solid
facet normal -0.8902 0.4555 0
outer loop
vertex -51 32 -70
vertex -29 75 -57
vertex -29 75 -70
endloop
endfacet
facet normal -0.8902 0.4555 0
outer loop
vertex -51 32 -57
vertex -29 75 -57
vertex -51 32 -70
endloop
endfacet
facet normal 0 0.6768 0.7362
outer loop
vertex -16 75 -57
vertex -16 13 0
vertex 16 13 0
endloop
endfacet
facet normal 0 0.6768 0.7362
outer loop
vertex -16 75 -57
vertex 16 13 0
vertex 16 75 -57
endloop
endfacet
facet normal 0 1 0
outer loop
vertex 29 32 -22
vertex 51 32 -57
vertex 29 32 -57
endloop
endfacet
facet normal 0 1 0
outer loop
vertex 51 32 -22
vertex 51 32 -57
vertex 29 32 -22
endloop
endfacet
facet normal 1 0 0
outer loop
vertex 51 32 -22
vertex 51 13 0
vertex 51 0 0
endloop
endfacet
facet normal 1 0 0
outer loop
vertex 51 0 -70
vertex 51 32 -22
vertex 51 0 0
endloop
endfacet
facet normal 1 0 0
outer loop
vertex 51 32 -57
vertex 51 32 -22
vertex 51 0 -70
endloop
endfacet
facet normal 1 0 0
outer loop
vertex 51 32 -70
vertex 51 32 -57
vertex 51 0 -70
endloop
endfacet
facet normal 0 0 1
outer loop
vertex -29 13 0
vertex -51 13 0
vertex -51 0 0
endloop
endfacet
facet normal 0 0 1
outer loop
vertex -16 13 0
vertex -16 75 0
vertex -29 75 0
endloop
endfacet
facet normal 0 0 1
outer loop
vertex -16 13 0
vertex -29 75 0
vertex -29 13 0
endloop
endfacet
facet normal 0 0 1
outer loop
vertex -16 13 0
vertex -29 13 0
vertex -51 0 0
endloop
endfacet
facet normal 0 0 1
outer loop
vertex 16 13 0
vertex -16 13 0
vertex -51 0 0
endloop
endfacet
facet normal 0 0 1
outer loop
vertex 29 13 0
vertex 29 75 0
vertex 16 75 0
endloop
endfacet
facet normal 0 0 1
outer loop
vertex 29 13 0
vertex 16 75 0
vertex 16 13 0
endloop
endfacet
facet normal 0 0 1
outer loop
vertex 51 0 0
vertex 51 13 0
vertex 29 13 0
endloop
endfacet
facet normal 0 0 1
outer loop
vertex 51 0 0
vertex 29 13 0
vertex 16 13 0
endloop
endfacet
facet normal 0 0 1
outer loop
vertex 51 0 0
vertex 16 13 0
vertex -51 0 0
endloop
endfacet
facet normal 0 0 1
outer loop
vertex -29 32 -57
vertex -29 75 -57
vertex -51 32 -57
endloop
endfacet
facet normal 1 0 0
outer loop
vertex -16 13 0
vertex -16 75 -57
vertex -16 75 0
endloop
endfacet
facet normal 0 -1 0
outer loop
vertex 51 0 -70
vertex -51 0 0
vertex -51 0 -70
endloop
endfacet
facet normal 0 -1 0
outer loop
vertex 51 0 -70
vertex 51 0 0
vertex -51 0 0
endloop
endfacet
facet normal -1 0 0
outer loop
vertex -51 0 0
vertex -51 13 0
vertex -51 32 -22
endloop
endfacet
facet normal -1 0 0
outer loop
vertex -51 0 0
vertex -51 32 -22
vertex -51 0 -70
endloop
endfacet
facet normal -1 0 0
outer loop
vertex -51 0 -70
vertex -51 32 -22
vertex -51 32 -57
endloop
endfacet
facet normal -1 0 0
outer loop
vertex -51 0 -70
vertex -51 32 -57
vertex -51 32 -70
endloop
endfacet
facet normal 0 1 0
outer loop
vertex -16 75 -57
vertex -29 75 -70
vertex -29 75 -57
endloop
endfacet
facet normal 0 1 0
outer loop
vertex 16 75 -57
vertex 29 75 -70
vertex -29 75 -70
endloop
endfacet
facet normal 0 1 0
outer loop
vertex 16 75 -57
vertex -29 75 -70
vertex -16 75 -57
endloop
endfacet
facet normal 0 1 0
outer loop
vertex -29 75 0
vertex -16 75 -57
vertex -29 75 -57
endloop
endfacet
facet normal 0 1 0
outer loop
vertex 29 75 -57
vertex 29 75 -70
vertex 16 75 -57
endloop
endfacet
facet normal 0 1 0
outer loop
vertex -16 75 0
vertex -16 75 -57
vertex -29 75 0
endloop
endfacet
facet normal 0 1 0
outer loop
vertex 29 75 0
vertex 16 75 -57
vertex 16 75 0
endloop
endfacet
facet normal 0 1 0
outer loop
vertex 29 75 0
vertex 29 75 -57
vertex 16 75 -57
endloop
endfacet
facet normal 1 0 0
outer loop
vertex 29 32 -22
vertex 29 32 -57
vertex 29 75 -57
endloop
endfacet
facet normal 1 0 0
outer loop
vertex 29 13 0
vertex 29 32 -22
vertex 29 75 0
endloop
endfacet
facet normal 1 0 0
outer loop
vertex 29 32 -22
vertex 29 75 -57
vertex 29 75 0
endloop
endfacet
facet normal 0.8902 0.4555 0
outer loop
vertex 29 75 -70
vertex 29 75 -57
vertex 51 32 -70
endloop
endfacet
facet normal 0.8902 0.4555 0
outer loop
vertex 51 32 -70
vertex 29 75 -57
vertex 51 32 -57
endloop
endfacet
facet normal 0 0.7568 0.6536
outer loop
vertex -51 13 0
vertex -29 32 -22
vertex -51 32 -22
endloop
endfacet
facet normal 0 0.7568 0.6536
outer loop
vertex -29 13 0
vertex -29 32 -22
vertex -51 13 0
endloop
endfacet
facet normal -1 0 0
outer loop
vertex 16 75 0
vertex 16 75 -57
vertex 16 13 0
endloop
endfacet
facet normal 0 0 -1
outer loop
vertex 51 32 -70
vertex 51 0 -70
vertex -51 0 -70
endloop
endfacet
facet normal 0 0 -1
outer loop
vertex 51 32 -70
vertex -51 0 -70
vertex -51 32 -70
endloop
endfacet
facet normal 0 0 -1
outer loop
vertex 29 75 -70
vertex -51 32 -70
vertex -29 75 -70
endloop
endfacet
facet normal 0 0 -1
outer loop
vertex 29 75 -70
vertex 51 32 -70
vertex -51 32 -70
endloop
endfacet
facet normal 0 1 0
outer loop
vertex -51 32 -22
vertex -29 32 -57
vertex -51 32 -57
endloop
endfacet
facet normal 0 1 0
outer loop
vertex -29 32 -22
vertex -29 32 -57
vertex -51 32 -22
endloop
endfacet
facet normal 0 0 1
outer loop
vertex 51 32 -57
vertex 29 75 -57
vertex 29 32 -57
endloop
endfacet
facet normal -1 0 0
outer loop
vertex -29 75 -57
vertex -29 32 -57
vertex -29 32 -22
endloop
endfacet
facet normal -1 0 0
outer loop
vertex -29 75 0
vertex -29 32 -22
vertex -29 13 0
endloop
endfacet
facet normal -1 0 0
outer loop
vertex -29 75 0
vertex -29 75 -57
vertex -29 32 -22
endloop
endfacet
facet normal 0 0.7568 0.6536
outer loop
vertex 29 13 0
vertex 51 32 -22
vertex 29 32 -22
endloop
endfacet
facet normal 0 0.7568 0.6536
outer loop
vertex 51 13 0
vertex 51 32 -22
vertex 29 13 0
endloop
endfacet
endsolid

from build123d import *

# Parameters (mm, degrees)
BOSS_EXTRUDE1_DEPTH      = 51
BOSS_EXTRUDE2_START      = 16
BOSS_EXTRUDE2_DEPTH      = 13
CUT_EXTRUDE1_REACH       = 109.121
BOSS_EXTRUDE3_DEPTH      = 16
BOSS_EXTRUDE3_DEPTH_BACK = 16


with BuildPart() as part:
    # Sketch1 → Boss-Extrude1 (new, symmetric)
    with BuildSketch(Plane(origin=(0, 0, 0), x_dir=(0, 0, -1), z_dir=(1, 0, 0))):
        Polygon((70, 75), (57, 75), (57, 32), (22, 32), (0, 13), (0, 0), (70, 0), align=None)
    extrude(amount=BOSS_EXTRUDE1_DEPTH, both=True)

    # Sketch1<3> → Boss-Extrude2 (add)
    with BuildSketch(Plane(origin=(0, 0, 0), x_dir=(0, 0, -1), z_dir=(1, 0, 0)).offset(BOSS_EXTRUDE2_START)):
        Polygon((0, 13), (57, 75), (57, 32), (22, 32), align=None)
        Polygon((0, 13), (57, 75), (0, 75), align=None)
    boss_extrude2 = extrude(amount=BOSS_EXTRUDE2_DEPTH)

    # Sketch2 → Cut-Extrude1 (cut, up to next)
    with BuildSketch(Plane.XY.offset(-57), mode=Mode.PRIVATE) as cut_extrude1_sk1:
        Polygon((29, 75), (51, 32), (51, 75), align=None)
    cut_extrude1_tool1 = extrude(cut_extrude1_sk1.sketch, amount=-CUT_EXTRUDE1_REACH, mode=Mode.PRIVATE) & part.part
    cut_extrude1 = cut_extrude1_tool1.solids().sort_by_distance((43.666667, 60.666667, -57))[0]
    add(cut_extrude1, mode=Mode.SUBTRACT)

    # Mirror1: Boss-Extrude2, Cut-Extrude1 across plane
    add(boss_extrude2.mirror(Plane(origin=(0, 0, 0), x_dir=(0, 0, 1), z_dir=(1, 0, 0))))
    add(cut_extrude1.mirror(Plane(origin=(0, 0, 0), x_dir=(0, 0, 1), z_dir=(1, 0, 0))), mode=Mode.SUBTRACT)

    # Sketch1<4> → Boss-Extrude3 (add, two sides: drawn at the far end of the back side and taken through both)
    with BuildSketch(Plane(origin=(0, 0, 0), x_dir=(0, 0, -1), z_dir=(1, 0, 0)).offset(-BOSS_EXTRUDE3_DEPTH_BACK)):
        Polygon((0, 13), (57, 75), (57, 32), (22, 32), align=None)
    extrude(amount=BOSS_EXTRUDE3_DEPTH + BOSS_EXTRUDE3_DEPTH_BACK)


solid = part.part
